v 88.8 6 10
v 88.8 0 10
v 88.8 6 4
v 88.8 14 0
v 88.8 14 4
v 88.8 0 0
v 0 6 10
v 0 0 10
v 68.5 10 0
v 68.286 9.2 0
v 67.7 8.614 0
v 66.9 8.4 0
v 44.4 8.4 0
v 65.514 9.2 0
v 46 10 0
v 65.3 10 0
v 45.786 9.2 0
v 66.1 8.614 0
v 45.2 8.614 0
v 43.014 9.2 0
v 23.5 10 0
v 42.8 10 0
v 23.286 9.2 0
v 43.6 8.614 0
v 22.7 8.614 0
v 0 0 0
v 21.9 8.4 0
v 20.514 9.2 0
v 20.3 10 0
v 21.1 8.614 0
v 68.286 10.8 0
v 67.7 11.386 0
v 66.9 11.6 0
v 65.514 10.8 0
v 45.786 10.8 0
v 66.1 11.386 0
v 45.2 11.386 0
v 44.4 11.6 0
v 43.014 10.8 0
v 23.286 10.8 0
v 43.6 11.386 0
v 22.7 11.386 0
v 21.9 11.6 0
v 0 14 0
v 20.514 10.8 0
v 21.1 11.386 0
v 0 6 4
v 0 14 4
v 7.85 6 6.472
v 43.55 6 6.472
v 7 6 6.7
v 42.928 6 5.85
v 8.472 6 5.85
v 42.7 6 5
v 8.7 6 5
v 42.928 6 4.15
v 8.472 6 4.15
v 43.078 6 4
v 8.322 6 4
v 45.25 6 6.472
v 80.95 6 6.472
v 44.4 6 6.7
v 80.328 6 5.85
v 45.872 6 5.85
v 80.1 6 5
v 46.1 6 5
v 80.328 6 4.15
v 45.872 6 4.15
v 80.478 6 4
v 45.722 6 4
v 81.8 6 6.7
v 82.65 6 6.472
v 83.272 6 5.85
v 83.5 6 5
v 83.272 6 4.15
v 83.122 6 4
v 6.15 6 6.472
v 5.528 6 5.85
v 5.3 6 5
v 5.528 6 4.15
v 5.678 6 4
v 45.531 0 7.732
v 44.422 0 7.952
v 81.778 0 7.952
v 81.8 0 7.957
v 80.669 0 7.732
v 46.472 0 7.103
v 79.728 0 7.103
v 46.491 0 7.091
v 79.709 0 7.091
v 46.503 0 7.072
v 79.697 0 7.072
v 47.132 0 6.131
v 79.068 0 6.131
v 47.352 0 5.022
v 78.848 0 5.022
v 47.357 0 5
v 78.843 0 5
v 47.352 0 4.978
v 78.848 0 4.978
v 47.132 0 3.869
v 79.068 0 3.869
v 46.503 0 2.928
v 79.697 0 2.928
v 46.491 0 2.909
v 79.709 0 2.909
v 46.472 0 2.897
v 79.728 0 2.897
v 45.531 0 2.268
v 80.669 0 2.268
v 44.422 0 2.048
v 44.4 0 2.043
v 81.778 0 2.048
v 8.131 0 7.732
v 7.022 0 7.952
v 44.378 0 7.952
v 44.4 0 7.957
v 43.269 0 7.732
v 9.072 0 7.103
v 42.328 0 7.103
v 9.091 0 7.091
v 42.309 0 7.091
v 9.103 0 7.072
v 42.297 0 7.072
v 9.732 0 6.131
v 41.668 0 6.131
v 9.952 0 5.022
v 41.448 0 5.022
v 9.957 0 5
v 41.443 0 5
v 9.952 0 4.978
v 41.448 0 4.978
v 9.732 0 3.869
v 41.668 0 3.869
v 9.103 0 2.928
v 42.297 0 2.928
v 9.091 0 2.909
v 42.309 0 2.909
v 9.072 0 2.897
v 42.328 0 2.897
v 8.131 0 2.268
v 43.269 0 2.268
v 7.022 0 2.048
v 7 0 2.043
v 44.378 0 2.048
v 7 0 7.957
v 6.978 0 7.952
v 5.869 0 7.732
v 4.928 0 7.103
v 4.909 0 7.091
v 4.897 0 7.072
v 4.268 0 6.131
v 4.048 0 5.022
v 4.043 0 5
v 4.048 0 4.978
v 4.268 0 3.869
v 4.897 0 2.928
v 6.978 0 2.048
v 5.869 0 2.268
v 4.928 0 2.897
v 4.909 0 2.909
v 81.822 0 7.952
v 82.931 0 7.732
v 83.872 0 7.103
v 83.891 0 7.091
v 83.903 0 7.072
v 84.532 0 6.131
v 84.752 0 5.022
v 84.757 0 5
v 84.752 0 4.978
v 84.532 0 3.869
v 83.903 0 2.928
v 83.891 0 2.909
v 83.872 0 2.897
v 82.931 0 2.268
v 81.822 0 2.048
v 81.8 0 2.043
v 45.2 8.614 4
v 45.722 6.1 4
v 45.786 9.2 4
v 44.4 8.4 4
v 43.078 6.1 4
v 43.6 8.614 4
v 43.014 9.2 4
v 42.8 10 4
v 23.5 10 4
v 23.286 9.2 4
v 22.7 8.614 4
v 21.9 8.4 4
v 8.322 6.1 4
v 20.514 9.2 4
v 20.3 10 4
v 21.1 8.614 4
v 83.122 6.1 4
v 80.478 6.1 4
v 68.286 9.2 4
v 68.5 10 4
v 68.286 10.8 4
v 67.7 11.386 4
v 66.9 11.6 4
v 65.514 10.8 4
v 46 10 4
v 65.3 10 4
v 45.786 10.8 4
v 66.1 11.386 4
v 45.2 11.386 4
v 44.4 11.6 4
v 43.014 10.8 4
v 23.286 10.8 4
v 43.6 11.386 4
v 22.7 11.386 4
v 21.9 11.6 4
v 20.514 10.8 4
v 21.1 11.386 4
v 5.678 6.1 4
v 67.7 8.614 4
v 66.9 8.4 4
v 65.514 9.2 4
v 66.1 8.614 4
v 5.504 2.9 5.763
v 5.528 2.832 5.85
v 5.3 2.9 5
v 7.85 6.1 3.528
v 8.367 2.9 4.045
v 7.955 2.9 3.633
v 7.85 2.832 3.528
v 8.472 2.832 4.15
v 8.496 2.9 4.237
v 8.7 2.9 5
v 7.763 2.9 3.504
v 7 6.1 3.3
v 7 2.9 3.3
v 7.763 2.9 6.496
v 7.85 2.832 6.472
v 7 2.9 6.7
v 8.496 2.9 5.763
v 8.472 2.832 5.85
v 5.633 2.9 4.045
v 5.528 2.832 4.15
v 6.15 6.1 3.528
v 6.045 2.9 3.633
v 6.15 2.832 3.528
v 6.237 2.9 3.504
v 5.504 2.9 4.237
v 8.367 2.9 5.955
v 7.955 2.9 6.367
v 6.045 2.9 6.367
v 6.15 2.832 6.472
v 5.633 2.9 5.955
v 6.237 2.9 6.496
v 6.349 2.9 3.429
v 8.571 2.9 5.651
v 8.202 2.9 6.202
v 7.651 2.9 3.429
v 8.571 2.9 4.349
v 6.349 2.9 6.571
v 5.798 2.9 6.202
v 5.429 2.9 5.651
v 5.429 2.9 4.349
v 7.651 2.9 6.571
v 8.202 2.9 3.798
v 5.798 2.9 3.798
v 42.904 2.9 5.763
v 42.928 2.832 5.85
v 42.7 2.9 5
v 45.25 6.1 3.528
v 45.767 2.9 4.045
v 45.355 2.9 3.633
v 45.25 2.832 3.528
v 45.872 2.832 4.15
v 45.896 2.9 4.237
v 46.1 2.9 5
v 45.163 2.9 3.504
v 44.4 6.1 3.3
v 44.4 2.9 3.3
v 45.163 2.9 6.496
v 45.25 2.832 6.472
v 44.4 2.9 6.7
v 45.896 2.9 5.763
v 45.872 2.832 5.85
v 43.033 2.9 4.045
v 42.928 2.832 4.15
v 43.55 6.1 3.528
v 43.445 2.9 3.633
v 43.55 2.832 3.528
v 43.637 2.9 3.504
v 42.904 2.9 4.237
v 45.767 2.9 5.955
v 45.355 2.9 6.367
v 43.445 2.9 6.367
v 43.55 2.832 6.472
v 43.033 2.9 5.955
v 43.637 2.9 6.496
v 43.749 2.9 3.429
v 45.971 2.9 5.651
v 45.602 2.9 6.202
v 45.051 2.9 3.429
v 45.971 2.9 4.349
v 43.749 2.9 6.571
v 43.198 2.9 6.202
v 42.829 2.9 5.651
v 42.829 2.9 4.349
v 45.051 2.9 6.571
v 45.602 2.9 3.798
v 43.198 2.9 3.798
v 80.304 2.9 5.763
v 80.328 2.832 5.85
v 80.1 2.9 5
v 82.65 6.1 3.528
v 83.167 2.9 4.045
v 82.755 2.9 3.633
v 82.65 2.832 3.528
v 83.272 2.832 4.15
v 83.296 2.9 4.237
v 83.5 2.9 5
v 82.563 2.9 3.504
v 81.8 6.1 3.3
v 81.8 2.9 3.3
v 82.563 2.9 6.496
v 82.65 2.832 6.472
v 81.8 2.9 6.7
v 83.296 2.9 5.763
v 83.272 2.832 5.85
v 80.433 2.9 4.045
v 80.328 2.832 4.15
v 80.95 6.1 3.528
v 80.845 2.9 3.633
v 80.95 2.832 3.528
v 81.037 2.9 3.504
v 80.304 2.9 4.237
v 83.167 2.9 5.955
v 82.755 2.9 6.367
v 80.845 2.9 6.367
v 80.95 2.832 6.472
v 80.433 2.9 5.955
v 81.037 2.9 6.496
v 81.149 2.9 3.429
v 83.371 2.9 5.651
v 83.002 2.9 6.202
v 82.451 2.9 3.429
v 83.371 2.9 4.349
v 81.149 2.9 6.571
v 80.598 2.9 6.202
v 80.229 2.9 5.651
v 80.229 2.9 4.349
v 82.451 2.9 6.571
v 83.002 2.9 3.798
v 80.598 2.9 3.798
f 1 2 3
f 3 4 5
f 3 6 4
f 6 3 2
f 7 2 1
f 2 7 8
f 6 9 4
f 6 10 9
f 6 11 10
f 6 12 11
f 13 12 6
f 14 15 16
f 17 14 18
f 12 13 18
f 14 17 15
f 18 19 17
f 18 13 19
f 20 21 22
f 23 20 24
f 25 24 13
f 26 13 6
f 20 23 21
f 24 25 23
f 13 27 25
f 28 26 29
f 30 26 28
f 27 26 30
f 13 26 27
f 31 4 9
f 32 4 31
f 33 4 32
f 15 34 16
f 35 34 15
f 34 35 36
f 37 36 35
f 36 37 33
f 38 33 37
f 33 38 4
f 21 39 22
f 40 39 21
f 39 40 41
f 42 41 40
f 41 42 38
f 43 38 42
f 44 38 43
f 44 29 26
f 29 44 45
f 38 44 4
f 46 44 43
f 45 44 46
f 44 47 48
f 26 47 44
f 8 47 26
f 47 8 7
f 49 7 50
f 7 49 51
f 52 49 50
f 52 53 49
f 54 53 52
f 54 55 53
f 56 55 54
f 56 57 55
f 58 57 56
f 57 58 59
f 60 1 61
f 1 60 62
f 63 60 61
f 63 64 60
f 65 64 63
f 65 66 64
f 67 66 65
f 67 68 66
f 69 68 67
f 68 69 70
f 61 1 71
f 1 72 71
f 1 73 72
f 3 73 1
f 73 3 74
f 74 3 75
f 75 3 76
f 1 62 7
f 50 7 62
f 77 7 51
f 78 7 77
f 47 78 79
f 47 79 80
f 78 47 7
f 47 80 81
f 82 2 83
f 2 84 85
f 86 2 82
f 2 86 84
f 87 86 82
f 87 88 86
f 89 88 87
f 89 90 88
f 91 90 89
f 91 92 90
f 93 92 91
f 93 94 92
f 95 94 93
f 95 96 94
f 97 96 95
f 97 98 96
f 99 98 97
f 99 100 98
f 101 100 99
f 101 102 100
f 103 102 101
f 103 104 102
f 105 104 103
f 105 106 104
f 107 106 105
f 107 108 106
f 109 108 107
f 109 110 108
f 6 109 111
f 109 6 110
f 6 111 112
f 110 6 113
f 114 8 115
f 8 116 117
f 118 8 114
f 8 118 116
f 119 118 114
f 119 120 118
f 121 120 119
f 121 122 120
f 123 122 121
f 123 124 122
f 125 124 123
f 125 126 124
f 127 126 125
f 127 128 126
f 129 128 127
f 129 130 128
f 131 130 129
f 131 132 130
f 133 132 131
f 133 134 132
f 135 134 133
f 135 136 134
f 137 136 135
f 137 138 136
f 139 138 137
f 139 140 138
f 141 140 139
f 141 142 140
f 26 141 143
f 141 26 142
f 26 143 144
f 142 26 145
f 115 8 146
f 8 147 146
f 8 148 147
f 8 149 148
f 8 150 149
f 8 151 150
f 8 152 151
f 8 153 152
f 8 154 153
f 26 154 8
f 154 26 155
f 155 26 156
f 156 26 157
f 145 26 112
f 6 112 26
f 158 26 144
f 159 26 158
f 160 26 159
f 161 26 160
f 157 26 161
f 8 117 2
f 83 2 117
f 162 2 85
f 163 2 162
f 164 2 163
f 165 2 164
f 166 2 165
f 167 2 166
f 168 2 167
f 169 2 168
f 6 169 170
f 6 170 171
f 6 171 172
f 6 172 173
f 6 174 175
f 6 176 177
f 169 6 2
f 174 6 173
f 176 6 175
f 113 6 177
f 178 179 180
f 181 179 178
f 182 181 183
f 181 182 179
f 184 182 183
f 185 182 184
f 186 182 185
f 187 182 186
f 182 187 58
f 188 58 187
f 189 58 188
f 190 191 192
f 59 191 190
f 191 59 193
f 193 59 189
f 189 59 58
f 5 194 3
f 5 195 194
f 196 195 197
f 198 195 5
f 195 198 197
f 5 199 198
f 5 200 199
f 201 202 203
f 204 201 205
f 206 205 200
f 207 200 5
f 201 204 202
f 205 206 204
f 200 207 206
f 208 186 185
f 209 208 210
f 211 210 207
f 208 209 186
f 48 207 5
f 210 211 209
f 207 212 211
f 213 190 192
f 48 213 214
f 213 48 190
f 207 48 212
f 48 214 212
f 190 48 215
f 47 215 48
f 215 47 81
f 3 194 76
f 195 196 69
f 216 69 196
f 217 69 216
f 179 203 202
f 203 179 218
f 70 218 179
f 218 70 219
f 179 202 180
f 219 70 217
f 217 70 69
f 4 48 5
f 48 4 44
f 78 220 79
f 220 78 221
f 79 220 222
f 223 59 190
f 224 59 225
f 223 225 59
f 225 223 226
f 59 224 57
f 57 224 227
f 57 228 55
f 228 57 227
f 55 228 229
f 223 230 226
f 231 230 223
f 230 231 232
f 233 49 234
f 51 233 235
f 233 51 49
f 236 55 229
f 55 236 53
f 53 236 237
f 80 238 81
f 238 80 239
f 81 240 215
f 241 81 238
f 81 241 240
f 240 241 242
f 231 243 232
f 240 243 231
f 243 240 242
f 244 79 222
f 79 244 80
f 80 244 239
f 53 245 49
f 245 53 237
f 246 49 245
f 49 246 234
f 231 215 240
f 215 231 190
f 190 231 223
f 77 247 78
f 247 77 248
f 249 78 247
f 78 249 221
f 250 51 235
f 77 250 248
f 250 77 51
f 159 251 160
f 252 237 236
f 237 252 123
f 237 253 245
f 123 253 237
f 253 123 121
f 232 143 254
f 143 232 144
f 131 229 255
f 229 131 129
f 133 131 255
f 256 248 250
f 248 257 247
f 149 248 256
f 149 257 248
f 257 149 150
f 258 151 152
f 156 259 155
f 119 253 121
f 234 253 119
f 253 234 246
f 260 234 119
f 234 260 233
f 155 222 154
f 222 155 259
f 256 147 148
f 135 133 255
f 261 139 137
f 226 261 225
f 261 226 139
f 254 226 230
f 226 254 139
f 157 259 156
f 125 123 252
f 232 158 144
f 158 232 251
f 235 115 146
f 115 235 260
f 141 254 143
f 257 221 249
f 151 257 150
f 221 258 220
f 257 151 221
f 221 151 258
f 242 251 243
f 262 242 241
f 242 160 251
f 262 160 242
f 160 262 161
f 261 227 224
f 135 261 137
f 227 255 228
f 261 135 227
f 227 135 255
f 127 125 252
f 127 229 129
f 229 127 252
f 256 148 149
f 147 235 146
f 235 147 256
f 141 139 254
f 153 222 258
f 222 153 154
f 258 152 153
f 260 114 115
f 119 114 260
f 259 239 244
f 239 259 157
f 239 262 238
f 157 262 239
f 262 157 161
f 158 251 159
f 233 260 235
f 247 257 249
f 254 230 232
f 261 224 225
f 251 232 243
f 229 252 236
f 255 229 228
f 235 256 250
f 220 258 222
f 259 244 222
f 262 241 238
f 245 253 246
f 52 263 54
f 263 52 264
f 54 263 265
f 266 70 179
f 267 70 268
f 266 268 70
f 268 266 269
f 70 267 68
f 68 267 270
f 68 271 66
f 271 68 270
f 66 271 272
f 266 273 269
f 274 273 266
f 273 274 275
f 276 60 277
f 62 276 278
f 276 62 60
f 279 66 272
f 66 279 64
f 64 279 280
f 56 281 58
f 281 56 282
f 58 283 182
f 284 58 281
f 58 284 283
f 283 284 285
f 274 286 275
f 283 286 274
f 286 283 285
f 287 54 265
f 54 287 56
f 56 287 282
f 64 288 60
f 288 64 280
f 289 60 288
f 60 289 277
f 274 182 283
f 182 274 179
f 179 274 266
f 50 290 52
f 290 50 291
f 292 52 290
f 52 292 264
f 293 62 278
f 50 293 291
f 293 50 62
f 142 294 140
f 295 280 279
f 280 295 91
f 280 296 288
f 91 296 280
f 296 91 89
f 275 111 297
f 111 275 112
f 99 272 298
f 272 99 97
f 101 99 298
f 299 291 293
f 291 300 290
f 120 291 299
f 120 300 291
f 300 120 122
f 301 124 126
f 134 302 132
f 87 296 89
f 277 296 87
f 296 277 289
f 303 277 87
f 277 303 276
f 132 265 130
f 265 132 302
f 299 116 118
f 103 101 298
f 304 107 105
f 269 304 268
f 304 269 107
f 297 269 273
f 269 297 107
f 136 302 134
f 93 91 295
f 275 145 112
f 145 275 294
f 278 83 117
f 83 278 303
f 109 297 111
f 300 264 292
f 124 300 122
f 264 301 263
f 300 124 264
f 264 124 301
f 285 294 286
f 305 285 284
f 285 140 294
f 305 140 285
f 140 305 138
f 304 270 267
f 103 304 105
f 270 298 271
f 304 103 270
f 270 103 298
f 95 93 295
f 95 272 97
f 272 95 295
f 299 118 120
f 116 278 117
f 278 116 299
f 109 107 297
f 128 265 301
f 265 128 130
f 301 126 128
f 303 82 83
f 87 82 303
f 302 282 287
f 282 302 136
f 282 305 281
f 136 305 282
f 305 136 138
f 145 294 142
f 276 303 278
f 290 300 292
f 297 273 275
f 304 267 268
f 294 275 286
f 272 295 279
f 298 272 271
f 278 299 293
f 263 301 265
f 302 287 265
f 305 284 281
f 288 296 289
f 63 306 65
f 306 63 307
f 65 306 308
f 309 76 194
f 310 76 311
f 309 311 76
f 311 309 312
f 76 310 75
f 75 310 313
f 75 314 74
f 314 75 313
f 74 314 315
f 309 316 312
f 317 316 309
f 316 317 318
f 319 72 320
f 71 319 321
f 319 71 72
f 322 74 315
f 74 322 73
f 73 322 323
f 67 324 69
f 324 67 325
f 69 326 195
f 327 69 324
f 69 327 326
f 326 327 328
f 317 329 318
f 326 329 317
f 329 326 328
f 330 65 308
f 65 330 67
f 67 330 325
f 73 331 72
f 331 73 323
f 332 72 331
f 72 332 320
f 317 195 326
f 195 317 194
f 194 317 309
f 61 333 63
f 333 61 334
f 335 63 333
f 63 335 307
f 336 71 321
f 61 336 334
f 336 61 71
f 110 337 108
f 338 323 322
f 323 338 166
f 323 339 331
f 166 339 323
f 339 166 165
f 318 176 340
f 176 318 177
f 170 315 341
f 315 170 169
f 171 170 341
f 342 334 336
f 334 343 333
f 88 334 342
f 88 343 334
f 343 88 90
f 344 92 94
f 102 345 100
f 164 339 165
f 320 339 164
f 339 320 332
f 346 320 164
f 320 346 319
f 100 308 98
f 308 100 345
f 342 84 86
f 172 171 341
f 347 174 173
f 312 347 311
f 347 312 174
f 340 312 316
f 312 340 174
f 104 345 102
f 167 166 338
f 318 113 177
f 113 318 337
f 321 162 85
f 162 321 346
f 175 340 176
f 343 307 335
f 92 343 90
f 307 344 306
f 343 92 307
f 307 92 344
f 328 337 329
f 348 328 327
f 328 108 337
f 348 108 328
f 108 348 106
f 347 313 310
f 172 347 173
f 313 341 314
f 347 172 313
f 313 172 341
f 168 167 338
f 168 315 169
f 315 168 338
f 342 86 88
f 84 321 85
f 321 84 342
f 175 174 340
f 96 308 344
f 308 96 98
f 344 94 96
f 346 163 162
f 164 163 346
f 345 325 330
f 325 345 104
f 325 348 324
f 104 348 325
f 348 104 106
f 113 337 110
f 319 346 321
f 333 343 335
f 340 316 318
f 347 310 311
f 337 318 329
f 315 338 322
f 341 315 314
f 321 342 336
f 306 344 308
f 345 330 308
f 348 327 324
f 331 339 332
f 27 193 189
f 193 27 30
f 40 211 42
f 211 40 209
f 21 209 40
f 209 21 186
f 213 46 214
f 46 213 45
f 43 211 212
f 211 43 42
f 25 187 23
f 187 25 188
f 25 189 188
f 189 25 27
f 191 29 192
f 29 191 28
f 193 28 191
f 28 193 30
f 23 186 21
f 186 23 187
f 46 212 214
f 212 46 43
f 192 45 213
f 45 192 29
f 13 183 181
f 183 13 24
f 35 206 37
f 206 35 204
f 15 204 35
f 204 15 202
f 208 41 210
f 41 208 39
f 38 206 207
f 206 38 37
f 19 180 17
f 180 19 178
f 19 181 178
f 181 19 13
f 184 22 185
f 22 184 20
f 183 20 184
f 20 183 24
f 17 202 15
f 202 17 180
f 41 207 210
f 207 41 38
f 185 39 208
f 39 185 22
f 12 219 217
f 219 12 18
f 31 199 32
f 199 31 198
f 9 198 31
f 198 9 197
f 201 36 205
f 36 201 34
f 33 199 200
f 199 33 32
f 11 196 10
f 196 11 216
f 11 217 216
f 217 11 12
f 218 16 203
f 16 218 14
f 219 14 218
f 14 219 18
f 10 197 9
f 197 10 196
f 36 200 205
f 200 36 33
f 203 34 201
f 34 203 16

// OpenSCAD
// rack_mount_gaming.scad — 19" 4U open tray rack mount (GAMING VARIANT)
// ATX motherboard (flat) + Zotac RTX 5090 Solid (vertical, 67.8mm wide / 329.7mm long) + ATX PSU
// Front panel mounts a 360mm radiator (3× 120mm fans on 120mm pitch)
// Tray depth increased to 400mm vs 350mm server variant to accommodate the longer GPU.
//
// Four L-shaped printable sections with seam joints:
//   FL (front-left)  — board front standoffs + front panel left
//   FR (front-right) — PSU cradle front      + front panel right
//   RL (rear-left)   — board rear standoffs  + rear panel left
//   RR (rear-right)  — PSU cradle rear       + rear panel right
//
// Joint strategy — no interior walls:
//   • Floor-edge box joint tabs (tw=3mm tall) along the floor seam
//   • Front/rear panel tongue tabs at 2 Z heights (on the panel face)
//   • Side rail tongue tabs at 2 Z heights (on the rail face)
//   Each tab is part of an existing wall/floor, so nothing floats.

// ─── PARAMETERS ───────────────────────────────────────────────────────────────

rack_u   = 4;
u_mm     = 44.45;
rack_h   = rack_u * u_mm;   // 177.8 mm
rack_ow  = 482.6;
ear_w    = 19.3;
tray_w   = rack_ow - 2*ear_w;  // ≈ 444 mm

tray_d   = 400;  // deeper than server variant (350mm) to fit 329.7mm GPU + clearance
tw       = 4;   // wall thickness — increased from 3mm to compensate for honeycomb cutouts

// ─── HONEYCOMB PARAMETERS ─────────────────────────────────────────────────────
// hc_r  = hex cell inscribed radius (flat-to-flat = 2*hc_r)
// hc_w  = hex wall thickness between cells
// hc_mg = solid margin kept clear of any panel edge / joint / feature
hc_r     = 3.5;   // 7mm flat-to-flat cells — good airflow, finger-safe
hc_w     = 1.2;   // 2-extrusion-width walls — strong and clean
hc_mg    = 12;    // 12mm solid border around every edge and feature

atx_w    = 305;
atx_d    = 243.84;  // 9.6" standard ATX depth (board is 12" × 9.6")
soff_h   = 6;
soff_od  = 6.5;
soff_id  = 3.2;

// Hole positions from VenOunan ATX Motherboard Pattern (standard ATX layout).
// pt[0] = mm from left edge of board (X parallel to IO)
// pt[1] = mm from front edge of board (Y, increasing toward IO)
// by0 already adds the 1mm IO gap, so these are pure board-relative coords.
//
// Column X:  A/G/K = 16.51   C/H/L = 140.97   F/J/M = 298.45
// Row    Y:  K/L/M =  6.35   G/H/J =  66.04   F = 220.98   A/C = 233.68
atx_holes = [
  [  16, 231.68],  // A: 0.40" from IO, left column
  [ 140.97, 231.68],  // C: 0.40" from IO, center column
  [ 298.45, 218.98],  // F: 0.90" from IO, right column
  [  16,  78],  // G: middle row, left column
  [ 140.97,  78],  // H: middle row, center column
  [ 298.45,  78],  // J: middle row, right column
  [  16,   6],  // K: 0.25" from front, left column
  [ 140.97,   6],  // L: 0.25" from front, center column
  [ 298.45,   6],  // M: 0.25" from front, right column
];

bx0 = tw;
by0 = tray_d - tw - atx_d - 1;  // 1mm clearance between IO edge and rear panel for GPU bracket tabs

psu_xw   = 86;
psu_yd   = 140;
psu_zh   = 150;

// PSU mounting hole positions — X coords are in MODEL space (front-of-case view).
// Adam measures from the BACK, so left/right are mirrored: Adam's right = model's left.
//
//   Adam's view (from back)    →   Model coord
//   top-right  (5mm  from Adam-right) →  5.0mm from model-left
//   top-left   (16mm from Adam-left)  →  86-16 = 70.0mm from model-left
//   bottom-right (5.6mm from Adam-right, 7.3mm up)  →  5.6mm from model-left
//   bottom-left  (6.5mm from Adam-left, 31mm up)    →  86-6.5 = 79.5mm from model-left

psu_hole_tl_x =   5.4;   // model top-left    = Adam's top-right (confirmed correct)
psu_hole_tr_x =  69.7;   // model top-right   = Adam's top-left  (16mm from Adam's left)
psu_hole_bl_x =   5.4;   // model bottom-left = Adam's bottom-right (5.6mm from Adam's right)
psu_hole_br_x =  80;   // model bottom-right= Adam's bottom-left  (6.5mm from Adam's left → 86-6.5)

psu_hole_top_z =  145.0;  // both top holes: 5mm from top  (150 - 5)
psu_hole_bl_z  =    7.3;  // model bottom-left  = Adam's bottom-right: 7.3mm from bottom
psu_hole_br_z  =   31.0;  // model bottom-right = Adam's bottom-left:  31mm from bottom

psu_holes = [
    [ psu_hole_tl_x, psu_hole_top_z ],  // top-left
    [ psu_hole_tr_x, psu_hole_top_z ],  // top-right
    [ psu_hole_bl_x, psu_hole_bl_z  ],  // bottom-left
    [ psu_hole_br_x, psu_hole_br_z  ],  // bottom-right
];

psu_boss_c  = 10;   // boss footprint size (square)
psu_boss_th = 4;    // boss protrusion beyond inner face (into tray)
psu_gap  = 12;
psu_x0   = bx0 + atx_w + psu_gap;   // 320
psu_y0   = tray_d - tw - psu_yd;

gpu_l    = 329.7;  // Zotac 5090 Solid: 329.7mm length
gpu_zh   = 137.8;  // Zotac 5090 Solid: 137.8mm height (PCIe edge to top)
gpu_xw   = 67.8;   // Zotac 5090 Solid: 67.8mm wide (3.5 slots)
pcie_bx  = 110;
pcie_by  = 50;
gpu_x0   = bx0 + pcie_bx - gpu_xw/2;
gpu_y0   = by0 + pcie_by - 134.9;  // adjusted for longer GPU (was -73)

bkt_cut_w   = gpu_xw + 1;
bkt_cut_h   = 140;  // taller to match 5090 Solid height (was 121)
bkt_cut_z0  = tw;
bkt_cut_x0  = gpu_x0 - 0.5;

ret_bar_w      = bkt_cut_w + 20;
ret_bar_h      = 10;
ret_bar_d      = tw + 2;
ret_screw_d    = 3.4;
ret_bar_z0     = bkt_cut_z0 + bkt_cut_h;
ret_boss_inset = 8;   // how far bosses protrude INWARD from inner panel face

ret_lip_d   = 8;    // lip protrusion depth — extended to sit over GPU bracket (was 3mm)
ret_lip_h   = 4;    // lip thickness (Z)
ret_gpu_screw_d = 3.2;          // M3 clearance for GPU bracket screws
ret_gpu_screw_sp = 20.5;        // center-to-center spacing of GPU bracket holes

tab_sw  = 10.5;
tab_sd  = 5;
tab_x   = [gpu_x0 + gpu_xw*0.2, gpu_x0 + gpu_xw*0.5, gpu_x0 + gpu_xw*0.8];  // 3 slots for wider 5090 bracket

fan_sq   = 120;
fan_msp  = 105;
// Three fans on 120mm pitch — matches a 360mm radiator (screw holes align to rad holes)
fan1_cx  = tray_w/2 - 120;  // 102mm — leftmost
fan2_cx  = tray_w/2;         // 222mm — centre
fan3_cx  = tray_w/2 + 120;  // 342mm — rightmost
fan_cz   = rack_h / 2;

io_w     = 165;
io_h     = 46;
io_x0    = 150;   // IO shield at left (IO) edge of board — standard ATX position
io_z0    = tw + soff_h;

cut_x    = tray_w / 2;   // ≈ 222 mm
cut_y    = tray_d / 2;   // 200 mm

// Joint geometry
fj_d     = 6;     // tab depth (protrusion past seam face)
fj_w     = 18;    // tab width along seam
fj_fit   = 0.25;  // socket clearance per side
fj_th    = 8;     // panel/rail tab height (for the wall-face tabs)

// Ear interlock geometry
etab_d   = tw;    // tab depth = wall thickness — slot goes flush through rail, clearly visible
etab_h   = 15;    // tab height (Z direction)
etab_fit = 0.2;   // slot clearance per side

// Rear support lip
lip_yd   = 25;    // how far the lip extends behind the rear panel
lip_zh   = 6;     // lip thickness (Z)
lip_md   = 4.5;   // M4 clearance hole for bolting to rear cross-brace

// ─── UTILITY ──────────────────────────────────────────────────────────────────

module standoff() {
    difference() {
        cylinder(h=soff_h, d=soff_od, $fn=24);
        cylinder(h=soff_h+0.1, d=soff_id, $fn=16);
    }
}

// Filter channel parameters — fits standard 120×120mm bare foam pads (3mm or 5mm thick)
filter_face  = 122;   // channel opening: 120mm pad + 1mm clearance per side
filter_depth =   3;   // recess depth — must be < tw (4mm); 3mm fits most common pads snugly

module fan_cutout(cx, cz) {
    translate([cx, -0.1, cz]) rotate([-90,0,0]) {
        // Main airflow hole (112mm dia — standard 120mm fan cutout)
        cylinder(h=tw+0.2, d=fan_sq-8, $fn=64);
        // Fan screw holes (M4 clearance)
        for (sx=[-1,1], sz=[-1,1])
            translate([sx*fan_msp/2, sz*fan_msp/2, 0])
                cylinder(h=tw+0.2, d=4.4, $fn=12);
        // Filter pad recess — square channel on the OUTER face (z=0 in rotated space)
        // 3mm deep, leaving 1mm of wall behind the foam before the airflow hole opens
        translate([-filter_face/2, -filter_face/2, 0])
            cube([filter_face, filter_face, filter_depth]);
    }
}

// ─── HONEYCOMB MODULE ─────────────────────────────────────────────────────────
// Cuts a hex grid through a wall of thickness `depth`.
// Place this in a difference() — the grid is oriented in the XZ plane (wall in Y).
//
//   w, h   = bounding box of the vent zone in X and Z
//   depth  = wall thickness (cut goes full depth + 0.2mm overcut)
//   r      = hex inscribed radius (flat-to-flat = 2r)
//   wall   = wall width between cells
//
// Origin is the bottom-left corner of the vent zone.
// Rotate/translate before calling to position on the target face.
module honeycomb(w, h, depth, r=hc_r, wall=hc_w) {
    pitch_x = (r + wall/2) * 2;          // column pitch
    pitch_z = (r + wall/2) * sqrt(3);    // row pitch
    nx = ceil(w / pitch_x) + 1;
    nz = ceil(h / pitch_z) + 1;
    for (col = [0:nx-1], row = [0:nz-1]) {
        cx = col * pitch_x + (row % 2 == 1 ? pitch_x/2 : 0);
        cz = row * pitch_z;
        if (cx > 0 && cx < w && cz > 0 && cz < h)
            translate([cx, -0.1, cz])
                rotate([-90, 0, 0])
                    cylinder(h=depth+0.2, r=r, $fn=6);
    }
}

// ─── JOINT MODULES ────────────────────────────────────────────────────────────
// All tabs attach to existing geometry (floor/panel/rail).  Nothing floats.
//
// ── X=cut_x seam: floor-edge box joints (3mm tall = floor thickness) ──────────
// Even-index tabs belong to the LEFT piece (FL, RL).
// Odd-index tabs belong to the RIGHT piece (FR, RR).

module xj_floor_L(y0, y1) {         // LEFT tabs protruding +X
    n = floor((y1-y0)/fj_w);
    for (i=[0:n-1]) if (i%2==0)
        translate([cut_x, y0+i*fj_w, 0]) cube([fj_d, fj_w, tw]);
}
module xj_floor_L_sock(y0, y1) {    // LEFT sockets (receive R tabs)
    n = floor((y1-y0)/fj_w);
    for (i=[0:n-1]) if (i%2==1)
        translate([cut_x-fj_d-0.01, y0+i*fj_w-fj_fit, -0.01])
            cube([fj_d+0.02, fj_w+2*fj_fit, tw+0.02]);
}
module xj_floor_R(y0, y1) {         // RIGHT tabs protruding -X
    n = floor((y1-y0)/fj_w);
    for (i=[0:n-1]) if (i%2==1)
        translate([cut_x-fj_d, y0+i*fj_w, 0]) cube([fj_d, fj_w, tw]);
}
module xj_floor_R_sock(y0, y1) {    // RIGHT sockets (receive L tabs)
    n = floor((y1-y0)/fj_w);
    for (i=[0:n-1]) if (i%2==0)
        translate([cut_x-0.01, y0+i*fj_w-fj_fit, -0.01])
            cube([fj_d+0.02, fj_w+2*fj_fit, tw+0.02]);
}

// ── Y=cut_y seam: floor-edge box joints ──────────────────────────────────────
// Even-index tabs belong to the FRONT piece (FL, FR).
// Odd-index tabs belong to the REAR piece (RL, RR).

module yj_floor_F(x0, x1) {         // FRONT tabs protruding +Y
    n = floor((x1-x0)/fj_w);
    for (i=[0:n-1]) if (i%2==0)
        translate([x0+i*fj_w, cut_y, 0]) cube([fj_w, fj_d, tw]);
}
module yj_floor_F_sock(x0, x1) {    // FRONT sockets (receive R tabs)
    n = floor((x1-x0)/fj_w);
    for (i=[0:n-1]) if (i%2==1)
        translate([x0+i*fj_w-fj_fit, cut_y-fj_d-0.01, -0.01])
            cube([fj_w+2*fj_fit, fj_d+0.02, tw+0.02]);
}
module yj_floor_R(x0, x1) {         // REAR tabs protruding -Y
    n = floor((x1-x0)/fj_w);
    for (i=[0:n-1]) if (i%2==1)
        translate([x0+i*fj_w, cut_y-fj_d, 0]) cube([fj_w, fj_d, tw]);
}
module yj_floor_R_sock(x0, x1) {    // REAR sockets (receive F tabs)
    n = floor((x1-x0)/fj_w);
    for (i=[0:n-1]) if (i%2==0)
        translate([x0+i*fj_w-fj_fit, cut_y-0.01, -0.01])
            cube([fj_w+2*fj_fit, fj_d+0.02, tw+0.02]);
}

// ── Front panel seam at X=cut_x ───────────────────────────────────────────────
// Panel is tw=4mm thick in Y.  Tabs sit within that thickness, at 2 Z heights.
// FL has the tongue; FR has the groove.
// Tab Z positions are near top/bottom of panel — the centre fan (fan2) sits exactly
// at cut_x and its cutout spans z=27.9–149.9mm, so tabs must be outside that range.
fp_tab_z = [15, rack_h - 15];   // z=15mm (bottom) and z=162.8mm (top) — both clear of fan

module front_panel_tongue() {
    for (z = fp_tab_z)
        translate([cut_x, 0, z-fj_th/2]) cube([fj_d, tw, fj_th]);
}
module front_panel_groove() {
    for (z = fp_tab_z)
        translate([cut_x-0.01, -0.1, z-fj_th/2-fj_fit])
            cube([fj_d+0.12, tw+0.2, fj_th+2*fj_fit]);
}

// ── Rear panel seam at X=cut_x ────────────────────────────────────────────────
// RL has the tongue; RR has the groove.

module rear_panel_tongue() {
    for (z=[rack_h*0.33, rack_h*0.67])
        translate([cut_x, tray_d-tw, z-fj_th/2]) cube([fj_d, tw, fj_th]);
}
module rear_panel_groove() {
    for (z=[rack_h*0.33, rack_h*0.67])
        translate([cut_x-0.01, tray_d-tw-0.1, z-fj_th/2-fj_fit])
            cube([fj_d+0.12, tw+0.2, fj_th+2*fj_fit]);
}

// ── Left rail seam at Y=cut_y ─────────────────────────────────────────────────
// Rail is tw=3mm wide in X.  FL has tongue; RL has groove.

module left_rail_tongue() {
    for (z=[rack_h*0.33, rack_h*0.67])
        translate([0, cut_y, z-fj_th/2]) cube([tw, fj_d, fj_th]);
}
module left_rail_groove() {
    for (z=[rack_h*0.33, rack_h*0.67])
        translate([-0.1, cut_y-0.01, z-fj_th/2-fj_fit])
            cube([tw+0.2, fj_d+0.12, fj_th+2*fj_fit]);
}

// ── Right rail seam at Y=cut_y ────────────────────────────────────────────────
// FR has tongue; RR has groove.

module right_rail_tongue() {
    for (z=[rack_h*0.33, rack_h*0.67])
        translate([tray_w-tw, cut_y, z-fj_th/2]) cube([tw, fj_d, fj_th]);
}
module right_rail_groove() {
    for (z=[rack_h*0.33, rack_h*0.67])
        translate([tray_w-tw-0.1, cut_y-0.01, z-fj_th/2-fj_fit])
            cube([tw+0.2, fj_d+0.12, fj_th+2*fj_fit]);
}

// ── Ear interlocks ────────────────────────────────────────────────────────────
// The tray rails start at Y=tw (no front face).  The ear extension fills that
// front face gap (X=0..tw, Y=0..tw, Z=tw..rack_h).  Interlock tabs protrude
// from the extension's back face (+Y from Y=tw) into the rail front face slots.
// The ear slides in from the side (+X for left, -X for right) and the tabs ride
// into the slots — no through-holes, no assembly conflict.

module left_ear_tabs() {
    // Protrude +Y from extension back face (Y=tw in ear module space)
    for (zi = [1:3])
        translate([ear_w, tw, rack_h*zi/4 - etab_h/2]) cube([tw, etab_d, etab_h]);
}
module left_ear_slots() {
    // Cut into the left rail's front face in the +Y direction
    for (zi = [1:3])
        translate([-0.1, tw-0.1, rack_h*zi/4 - etab_h/2 - etab_fit])
            cube([tw+0.2, etab_d+etab_fit+0.1, etab_h+2*etab_fit]);
}

module right_ear_tabs() {
    // Protrude +Y from extension back face (Y=tw in ear module space)
    for (zi = [1:3])
        translate([-tw, tw, rack_h*zi/4 - etab_h/2]) cube([tw, etab_d, etab_h]);
}
module right_ear_slots() {
    // Cut into the right rail's front face in the +Y direction
    for (zi = [1:3])
        translate([tray_w-tw-0.1, tw-0.1, rack_h*zi/4 - etab_h/2 - etab_fit])
            cube([tw+0.2, etab_d+etab_fit+0.1, etab_h+2*etab_fit]);
}

// ─── STRUCTURAL MODULES ───────────────────────────────────────────────────────

module atx_standoffs() {
    for (pt = atx_holes)
        translate([bx0 + pt[0], by0 + pt[1], tw]) standoff();
}

module front_panel_solid() {
    // Inset by tw on each side — ears fill the gap at X=[0,tw] and X=[tray_w-tw,tray_w]
    // Three 120mm fan cutouts handle all the ventilation — no honeycomb needed here.
    difference() {
        translate([tw, 0, 0]) cube([tray_w-2*tw, tw, rack_h]);
        fan_cutout(fan1_cx, fan_cz);
        fan_cutout(fan2_cx, fan_cz);
        fan_cutout(fan3_cx, fan_cz);
    }
}

// Helper: one L-shaped boss that bridges a PSU mounting hole to the two nearest panel edges
// so the boss is never a floating island in the middle of the PSU opening.
module psu_boss_bridge(h) {
    hx   = psu_x0 + h[0];
    hz   = tw + h[1];
    // Horizontal bridge: hole centred at hx, spans from PSU edge to hole+half-boss
    bx0_ = (h[0] < psu_xw/2) ? psu_x0           : hx - psu_boss_c/2;
    bx1_ = (h[0] < psu_xw/2) ? hx + psu_boss_c/2 : psu_x0 + psu_xw;
    // Vertical bridge: hole centred at hz, spans from floor/ceiling edge to hole+half-boss
    bz0_ = (h[1] < psu_zh/2) ? tw                : hz - psu_boss_c/2;
    bz1_ = (h[1] < psu_zh/2) ? hz + psu_boss_c/2 : tw + psu_zh;
    translate([bx0_,              -psu_boss_th, hz - psu_boss_c/2]) cube([bx1_-bx0_,    tw+psu_boss_th, psu_boss_c]);
    translate([hx - psu_boss_c/2, -psu_boss_th, bz0_])             cube([psu_boss_c, tw+psu_boss_th, bz1_-bz0_]);
}

module rear_panel_solid() {
    psu_c   = psu_boss_c;
    boss_th = psu_boss_th;
    m4_d    = 4.5;  // M4 clearance hole diameter

    // Honeycomb zones (all in rear-panel local coords where Y=0 is outer face):
    //   Zone A: left of PCIe bracket opening — board/VRM area
    //     x: hc_mg  ..  bkt_cut_x0 - hc_mg
    //     z: hc_mg  ..  rack_h - hc_mg
    //   Zone B: between PCIe bracket and IO shield
    //     x: bkt_cut_x0+bkt_cut_w+hc_mg  ..  io_x0-hc_mg
    //     z: hc_mg  ..  io_z0-hc_mg  (below IO opening)  AND  io_z0+io_h+hc_mg..rack_h-hc_mg (above)
    //   Zone C: right of PSU
    //     x: psu_x0+psu_xw+hc_mg  ..  tray_w-hc_mg
    //     z: hc_mg  ..  rack_h-hc_mg

    rp_zone_a_x0 = hc_mg;
    rp_zone_a_x1 = bkt_cut_x0 - hc_mg;
    rp_zone_b_x0 = bkt_cut_x0 + bkt_cut_w + hc_mg;
    rp_zone_b_x1 = io_x0 - hc_mg;
    rp_zone_c_x0 = psu_x0 + psu_xw + hc_mg;
    rp_zone_c_x1 = tray_w - hc_mg;

    difference() {
        union() {
            // Panel with all openings already cut — bosses added after so they
            // survive the opening cuts even when not in a corner zone
            difference() {
                cube([tray_w, tw, rack_h]);
                // IO shield opening
                translate([io_x0, -0.1, io_z0]) cube([io_w, tw+0.2, io_h]);
                // PSU opening — 3 cuts that preserve 10mm corners
                translate([psu_x0,       -0.1, tw+psu_c])        cube([psu_xw,          tw+0.2, psu_zh-2*psu_c]);
                translate([psu_x0+psu_c, -0.1, tw])               cube([psu_xw-2*psu_c, tw+0.2, psu_c]);
                translate([psu_x0+psu_c, -0.1, tw+psu_zh-psu_c]) cube([psu_xw-2*psu_c, tw+0.2, psu_c]);
                // PCIe bracket opening
                translate([bkt_cut_x0, -0.1, bkt_cut_z0]) cube([bkt_cut_w, tw+0.2, bkt_cut_h]);
            }
            // PSU mounting bosses — L-shaped bridges so no boss floats in the opening
            for (h = psu_holes) psu_boss_bridge(h);
        }
        // PSU M4 mounting holes drilled through bosses and panel
        for (h = psu_holes)
            translate([psu_x0 + h[0], -boss_th-0.1, tw + h[1]])
                rotate([-90,0,0]) cylinder(h=tw+boss_th+0.2, d=m4_d, $fn=16);
        // Retainer bar screw holes through rear panel — left, centre, right (3 screws on gaming variant)
        for (bx = [bkt_cut_x0-7,
                   bkt_cut_x0 - (ret_bar_w-bkt_cut_w)/2 + ret_bar_w/2,
                   bkt_cut_x0+bkt_cut_w+7])
            translate([bx, -0.1, ret_bar_z0+ret_bar_h/2])
                rotate([-90,0,0]) cylinder(h=tw+0.2, d=ret_screw_d, $fn=12);
        // ── Honeycomb venting ───────────────────────────────────────────────────
        // Zone A: left of PCIe bracket opening
        if (rp_zone_a_x1 > rp_zone_a_x0 + hc_mg)
            translate([rp_zone_a_x0, 0, hc_mg])
                honeycomb(rp_zone_a_x1-rp_zone_a_x0, rack_h-2*hc_mg, tw);
        // Zone B: between PCIe bracket and IO shield — split above/below IO opening
        if (rp_zone_b_x1 > rp_zone_b_x0 + hc_mg) {
            // Below IO shield
            translate([rp_zone_b_x0, 0, hc_mg])
                honeycomb(rp_zone_b_x1-rp_zone_b_x0, io_z0-2*hc_mg, tw);
            // Above IO shield (in this narrow strip)
            translate([rp_zone_b_x0, 0, io_z0+io_h+hc_mg])
                honeycomb(rp_zone_b_x1-rp_zone_b_x0, rack_h-io_z0-io_h-2*hc_mg, tw);
        }
        // Zone C: right of PSU
        if (rp_zone_c_x1 > rp_zone_c_x0 + hc_mg)
            translate([rp_zone_c_x0, 0, hc_mg])
                honeycomb(rp_zone_c_x1-rp_zone_c_x0, rack_h-2*hc_mg, tw);
        // Zone D: directly above IO shield opening — full IO opening width
        translate([io_x0 + hc_mg, 0, io_z0 + io_h + hc_mg])
            honeycomb(io_w - 2*hc_mg, rack_h - io_z0 - io_h - 2*hc_mg, tw);
    }
}

// GPU retainer bar mounting bosses — protrude INWARD from inner panel face.
// Screws go: bar (outside) → panel → boss (inside). Bar sits flush on outer face.
module retainer_bar_bosses() {
    // Centre boss X — bar is centred on bkt_cut: bar_x0 = bkt_cut_x0 - (ret_bar_w-bkt_cut_w)/2
    bar_x0_   = bkt_cut_x0 - (ret_bar_w - bkt_cut_w) / 2;
    centre_bx = bar_x0_ + ret_bar_w / 2;  // world X of centre screw
    difference() {
        union() {
            // Bosses on the INSIDE (−Y from inner face = tray_d−tw, protrude inward)
            translate([bkt_cut_x0-12,          tray_d-tw-ret_boss_inset, ret_bar_z0-1]) cube([10, ret_boss_inset, ret_bar_h+2]);
            translate([bkt_cut_x0+bkt_cut_w+2, tray_d-tw-ret_boss_inset, ret_bar_z0-1]) cube([10, ret_boss_inset, ret_bar_h+2]);
            // Centre boss — needed for the extra middle screw on the wider gaming bar
            translate([centre_bx-5,            tray_d-tw-ret_boss_inset, ret_bar_z0-1]) cube([10, ret_boss_inset, ret_bar_h+2]);
        }
        // Clearance holes — left, centre, right
        for (bx = [bkt_cut_x0-7, centre_bx, bkt_cut_x0+bkt_cut_w+7])
            translate([bx, tray_d-tw-ret_boss_inset-0.1, ret_bar_z0+ret_bar_h/2])
                rotate([-90,0,0]) cylinder(h=tw+ret_boss_inset+0.2, d=ret_screw_d, $fn=12);
    }
}

// Rear support lip — world coordinates. Extends behind the rear panel so the tray
// can rest on a cross-brace or rear rack rails instead of hanging from the ears alone.
// x0/x1 define which X slice of the tray this lip spans (split at cut_x for RL/RR).
module rear_support_lip(x0, x1) {
    difference() {
        translate([x0, tray_d-tw, 0]) cube([x1-x0, tw+lip_yd, lip_zh]);
        for (x = [x0+lip_yd/2 : lip_yd : x1-lip_yd/2])
            translate([x, tray_d+lip_yd/2, -0.1])
                cylinder(h=lip_zh+0.2, d=lip_md, $fn=16);
    }
}

module psu_cradle() {
    cw = 4;
    // psu_x0 is the LEFT edge of the PSU opening in model space.
    // The motherboard sits at X=4..309, PSU at X=321..407.
    // So psu_x0-cw side = LEFT wall = CLOSEST to motherboard → gets honeycomb.
    //    psu_x0+psu_xw side = RIGHT wall = further from motherboard → solid, full height.
    difference() {
        union() {
            // Floor cradle
            translate([psu_x0-cw, psu_y0, 0]) cube([psu_xw+2*cw, psu_yd+cw, tw+cw]);
            // Left wall (closest to motherboard) — full PSU height
            translate([psu_x0-cw, psu_y0, 0]) cube([cw, psu_yd, psu_zh]);
            // Right wall (further from motherboard) — full PSU height
            translate([psu_x0+psu_xw, psu_y0, 0]) cube([cw, psu_yd, psu_zh]);
        }
        // Honeycomb left wall only — wall is `cw` thick in X, spans psu_yd in Y, psu_zh in Z.
        // Module drills in +Y; rotate([0,0,-90]) maps Y→X so holes drill through the wall in X.
        // After that rotation, the grid's "w" param spans -Y (so translate to far Y edge),
        // and "h" spans Z as normal.
        translate([psu_x0 - cw, psu_y0 + psu_yd - hc_mg, hc_mg])
            rotate([0, 0, -90])
                honeycomb(psu_yd - 2*hc_mg, psu_zh - 2*hc_mg, cw, r=2.5, wall=1.0);
    }
}

// Plain tray shell — floor + two outer rails.  No interior ribs.
// Rails start at Y=tw (not Y=0) so the ear extensions can fill the front face gap.
module tray_shell(ear_slots=true) {
    difference() {
        union() {
            cube([tray_w, tray_d, tw]);
            translate([0,        tw, 0]) cube([tw, tray_d-tw, rack_h]);
            translate([tray_w-tw, tw, 0]) cube([tw, tray_d-tw, rack_h]);
        }
        // GPU floor tab slots
        for (tx = tab_x)
            translate([tx-tab_sw/2, tray_d-tw-tab_sd, -0.1])
                cube([tab_sw, tab_sd+tw+0.2, tw+0.2]);
        // Ear interlock slots — omit when ears are fused directly to FL/FR
        if (ear_slots) {
            left_ear_slots();
            right_ear_slots();
        }
        // ── Left rail honeycomb (inner face, X=0..tw, wall in X direction) ─────
        // Split at cut_y seam with hc_mg margin either side.
        // Honeycomb module expects wall in Y — rotate -90° around Z so Y→X.
        // Front half (Y=tw..cut_y)
        rotate([0, 0, -90])
            translate([-(cut_y - hc_mg), 0, hc_mg])
                honeycomb(cut_y - tw - 2*hc_mg, rack_h - 2*hc_mg, tw);
        // Rear half (Y=cut_y..tray_d-tw)
        rotate([0, 0, -90])
            translate([-(tray_d - tw - hc_mg), 0, hc_mg])
                honeycomb(tray_d - tw - cut_y - 2*hc_mg, rack_h - 2*hc_mg, tw);
        // ── Right rail honeycomb (inner face, X=tray_w-tw..tray_w, wall in X) ──
        // Same split at cut_y.
        // Front half
        translate([tray_w-tw, 0, 0]) rotate([0, 0, -90])
            translate([-(cut_y - hc_mg), 0, hc_mg])
                honeycomb(cut_y - tw - 2*hc_mg, rack_h - 2*hc_mg, tw);
        // Rear half
        translate([tray_w-tw, 0, 0]) rotate([0, 0, -90])
            translate([-(tray_d - tw - hc_mg), 0, hc_mg])
                honeycomb(tray_d - tw - cut_y - 2*hc_mg, rack_h - 2*hc_mg, tw);
    }
}

module gpu_retainer_bar() {
    difference() {
        union() {
            // Main bar body — screws to rear panel bosses
            cube([ret_bar_w, ret_bar_d, ret_bar_h]);
            // Lip at BOTTOM of bar (z=0), protruding in +Y — sits on top of GPU bracket
            translate([0, ret_bar_d, 0]) cube([ret_bar_w, ret_lip_d, ret_lip_h]);
        }
        // Panel mounting screw holes — 3 screws: left, centre, right (wider bar needs centre)
        for (bx = [7, ret_bar_w/2, ret_bar_w-7])
            translate([bx, -0.1, ret_bar_h/2]) rotate([-90,0,0]) {
                cylinder(h=ret_bar_d+0.2, d=ret_screw_d, $fn=12);
                cylinder(h=3, d1=6, d2=ret_screw_d, $fn=16);
            }
        // GPU bracket screw holes — 3 screws spread across the lip to match wider 5090 bracket
        for (gx = [ret_bar_w/2 - 22.5, ret_bar_w/2, ret_bar_w/2 + 22.5])
            translate([gx, ret_bar_d + ret_lip_d/2, -0.1])
                cylinder(h=ret_lip_h+0.2, d=ret_gpu_screw_d, $fn=12);
    }
}

module rack_ear() {
    difference() {
        cube([ear_w, tw, rack_h]);
        for (u = [0:rack_u-1]) {
            z1 = u*u_mm + (u_mm-15.875)/2;
            z2 = z1 + 15.875;
            for (zh = [z1, z2])
                translate([ear_w/2, -0.1, zh]) rotate([-90,0,0])
                    hull() {
                        translate([0,-2.5,0]) cylinder(h=tw+0.2, d=7.1, $fn=20);
                        translate([0, 2.5,0]) cylinder(h=tw+0.2, d=7.1, $fn=20);
                    }
        }
    }
}

// Extension fills the front face gap left by the rail recess (starts at Z=tw, above floor)
module rack_ear_L() { union() { rack_ear(); left_ear_tabs();  translate([ear_w,  0, tw]) cube([tw, tw, rack_h-tw]); } }
module rack_ear_R() { union() { rack_ear(); right_ear_tabs(); translate([-tw,    0, tw]) cube([tw, tw, rack_h-tw]); } }

// ─── GHOSTS ───────────────────────────────────────────────────────────────────

module ghost_board() {
    color("limegreen",0.2) translate([bx0,by0,tw+soff_h]) cube([atx_w,atx_d,1.6]);
}
module ghost_gpu() {
    color("royalblue",0.2) translate([gpu_x0,gpu_y0,tw+soff_h+1.6]) cube([gpu_xw,gpu_l,gpu_zh]);
}
module ghost_psu() {
    color("darkorange",0.2) translate([psu_x0,psu_y0,tw]) cube([psu_xw,psu_yd,psu_zh]);
}

// ─── ASSEMBLY ─────────────────────────────────────────────────────────────────

module assembly() {
    color("silver") {
        tray_shell();
        atx_standoffs();
        psu_cradle();
        front_panel_solid();
        translate([0, tray_d-tw, 0]) rear_panel_solid();
        retainer_bar_bosses();
        rear_support_lip(0, cut_x);
        rear_support_lip(cut_x, tray_w);
        translate([bkt_cut_x0-(ret_bar_w-bkt_cut_w)/2, tray_d, ret_bar_z0])
            gpu_retainer_bar();  // bar body sits above bracket top; lip at z=0 drops over it
    }
    color("dimgray") {
        // Ears fused into tray_FL/FR for printing — shown here for assembly preview only
        translate([-ear_w, 0, 0]) rack_ear_L();
        translate([tray_w, 0, 0]) rack_ear_R();
    }
    ghost_board();  ghost_gpu();  ghost_psu();
}

// ─── PRINTABLE SECTIONS ───────────────────────────────────────────────────────

// ── FL: Front-Left ─────────────────────────────────────────────────────────────
// On a Bambu P1S (256mm bed) the ear fits: 241×178mm total — print as one piece.
module tray_FL() {
    difference() {
        union() {
            intersection() {
                union() { tray_shell(ear_slots=false); front_panel_solid(); atx_standoffs(); }
                cube([cut_x, cut_y, rack_h+1]);
            }
            xj_floor_L(0, cut_y);       // floor tabs → FR
            yj_floor_F(0, cut_x);       // floor tabs → RL
            front_panel_tongue();        // panel tongue → FR
            left_rail_tongue();          // rail tongue  → RL
            // Left rack ear fused in — no separate ear piece needed
            translate([-ear_w, 0, 0]) rack_ear();
            translate([0, 0, tw]) cube([tw, tw, rack_h-tw]);  // front-face gap fill
        }
        xj_floor_L_sock(0, cut_y);      // floor sockets for FR's tabs
        yj_floor_F_sock(0, cut_x);      // floor sockets for RL's tabs
    }
}

// ── FR: Front-Right ────────────────────────────────────────────────────────────
// On a Bambu P1S (256mm bed) the ear fits: 241×178mm total — print as one piece.
module tray_FR() {
    difference() {
        union() {
            intersection() {
                union() { tray_shell(ear_slots=false); front_panel_solid(); psu_cradle(); atx_standoffs(); }
                translate([cut_x,0,0]) cube([tray_w-cut_x, cut_y, rack_h+1]);
            }
            xj_floor_R(0, cut_y);       // floor tabs → FL
            yj_floor_F(cut_x, tray_w);  // floor tabs → RR
            right_rail_tongue();         // rail tongue → RR
            // Right rack ear fused in — no separate ear piece needed
            translate([tray_w, 0, 0]) rack_ear();
            translate([tray_w-tw, 0, tw]) cube([tw, tw, rack_h-tw]);  // front-face gap fill
        }
        xj_floor_R_sock(0, cut_y);      // floor sockets for FL's tabs
        yj_floor_F_sock(cut_x, tray_w); // floor sockets for RR's tabs
        front_panel_groove();            // panel groove receives FL's tongue
    }
}

// ── RL: Rear-Left ──────────────────────────────────────────────────────────────
module tray_RL() {
    difference() {
        union() {
            intersection() {
                union() {
                    tray_shell();
                    atx_standoffs();
                    translate([0, tray_d-tw, 0]) rear_panel_solid();
                }
                translate([0,cut_y,0]) cube([cut_x, tray_d-cut_y, rack_h+1]);
            }
            xj_floor_L(cut_y, tray_d);  // floor tabs → RR
            yj_floor_R(0, cut_x);        // floor tabs → FL
            rear_panel_tongue();          // panel tongue → RR
            retainer_bar_bosses();        // outside mask — protrude beyond tray_d
            rear_support_lip(0, cut_x);  // outside mask — extends beyond tray_d
        }
        xj_floor_L_sock(cut_y, tray_d); // floor sockets for RR's tabs
        yj_floor_R_sock(0, cut_x);       // floor sockets for FL's tabs
        left_rail_groove();               // rail groove receives FL's tongue
    }
}

// ── RR: Rear-Right ─────────────────────────────────────────────────────────────
module tray_RR() {
    difference() {
        union() {
            intersection() {
                union() {
                    tray_shell();
                    atx_standoffs();
                    psu_cradle();
                    translate([0, tray_d-tw, 0]) rear_panel_solid();
                }
                translate([cut_x,cut_y,0]) cube([tray_w-cut_x, tray_d-cut_y, rack_h+1]);
            }
            xj_floor_R(cut_y, tray_d);  // floor tabs → RL
            yj_floor_R(cut_x, tray_w);  // floor tabs → FR
            rear_support_lip(cut_x, tray_w); // outside mask — extends beyond tray_d
        }
        xj_floor_R_sock(cut_y, tray_d); // floor sockets for RL's tabs
        yj_floor_R_sock(cut_x, tray_w); // floor sockets for FR's tabs
        rear_panel_groove();              // panel groove receives RL's tongue
        right_rail_groove();              // rail groove receives FR's tongue
    }
}

// ─── RENDER SELECTION ─────────────────────────────────────────────────────────
// Uncomment ONE section → F6 → Export as STL.  Print floor-face-down.
// tray_FL and tray_FR include their rack ears — no separate ear print needed (Bambu P1S bed).

//assembly();

//tray_FL();                              // left front half + left ear  (241×178mm)
//translate([-cut_x, 0, 0]) tray_FR();   // right front half + right ear (241×178mm)
//translate([0, -cut_y, 0])      tray_RL();
//translate([-cut_x, -cut_y, 0]) tray_RR();
gpu_retainer_bar();
//rack_ear();   // standalone ear (no longer needed — fused into FL/FR)
